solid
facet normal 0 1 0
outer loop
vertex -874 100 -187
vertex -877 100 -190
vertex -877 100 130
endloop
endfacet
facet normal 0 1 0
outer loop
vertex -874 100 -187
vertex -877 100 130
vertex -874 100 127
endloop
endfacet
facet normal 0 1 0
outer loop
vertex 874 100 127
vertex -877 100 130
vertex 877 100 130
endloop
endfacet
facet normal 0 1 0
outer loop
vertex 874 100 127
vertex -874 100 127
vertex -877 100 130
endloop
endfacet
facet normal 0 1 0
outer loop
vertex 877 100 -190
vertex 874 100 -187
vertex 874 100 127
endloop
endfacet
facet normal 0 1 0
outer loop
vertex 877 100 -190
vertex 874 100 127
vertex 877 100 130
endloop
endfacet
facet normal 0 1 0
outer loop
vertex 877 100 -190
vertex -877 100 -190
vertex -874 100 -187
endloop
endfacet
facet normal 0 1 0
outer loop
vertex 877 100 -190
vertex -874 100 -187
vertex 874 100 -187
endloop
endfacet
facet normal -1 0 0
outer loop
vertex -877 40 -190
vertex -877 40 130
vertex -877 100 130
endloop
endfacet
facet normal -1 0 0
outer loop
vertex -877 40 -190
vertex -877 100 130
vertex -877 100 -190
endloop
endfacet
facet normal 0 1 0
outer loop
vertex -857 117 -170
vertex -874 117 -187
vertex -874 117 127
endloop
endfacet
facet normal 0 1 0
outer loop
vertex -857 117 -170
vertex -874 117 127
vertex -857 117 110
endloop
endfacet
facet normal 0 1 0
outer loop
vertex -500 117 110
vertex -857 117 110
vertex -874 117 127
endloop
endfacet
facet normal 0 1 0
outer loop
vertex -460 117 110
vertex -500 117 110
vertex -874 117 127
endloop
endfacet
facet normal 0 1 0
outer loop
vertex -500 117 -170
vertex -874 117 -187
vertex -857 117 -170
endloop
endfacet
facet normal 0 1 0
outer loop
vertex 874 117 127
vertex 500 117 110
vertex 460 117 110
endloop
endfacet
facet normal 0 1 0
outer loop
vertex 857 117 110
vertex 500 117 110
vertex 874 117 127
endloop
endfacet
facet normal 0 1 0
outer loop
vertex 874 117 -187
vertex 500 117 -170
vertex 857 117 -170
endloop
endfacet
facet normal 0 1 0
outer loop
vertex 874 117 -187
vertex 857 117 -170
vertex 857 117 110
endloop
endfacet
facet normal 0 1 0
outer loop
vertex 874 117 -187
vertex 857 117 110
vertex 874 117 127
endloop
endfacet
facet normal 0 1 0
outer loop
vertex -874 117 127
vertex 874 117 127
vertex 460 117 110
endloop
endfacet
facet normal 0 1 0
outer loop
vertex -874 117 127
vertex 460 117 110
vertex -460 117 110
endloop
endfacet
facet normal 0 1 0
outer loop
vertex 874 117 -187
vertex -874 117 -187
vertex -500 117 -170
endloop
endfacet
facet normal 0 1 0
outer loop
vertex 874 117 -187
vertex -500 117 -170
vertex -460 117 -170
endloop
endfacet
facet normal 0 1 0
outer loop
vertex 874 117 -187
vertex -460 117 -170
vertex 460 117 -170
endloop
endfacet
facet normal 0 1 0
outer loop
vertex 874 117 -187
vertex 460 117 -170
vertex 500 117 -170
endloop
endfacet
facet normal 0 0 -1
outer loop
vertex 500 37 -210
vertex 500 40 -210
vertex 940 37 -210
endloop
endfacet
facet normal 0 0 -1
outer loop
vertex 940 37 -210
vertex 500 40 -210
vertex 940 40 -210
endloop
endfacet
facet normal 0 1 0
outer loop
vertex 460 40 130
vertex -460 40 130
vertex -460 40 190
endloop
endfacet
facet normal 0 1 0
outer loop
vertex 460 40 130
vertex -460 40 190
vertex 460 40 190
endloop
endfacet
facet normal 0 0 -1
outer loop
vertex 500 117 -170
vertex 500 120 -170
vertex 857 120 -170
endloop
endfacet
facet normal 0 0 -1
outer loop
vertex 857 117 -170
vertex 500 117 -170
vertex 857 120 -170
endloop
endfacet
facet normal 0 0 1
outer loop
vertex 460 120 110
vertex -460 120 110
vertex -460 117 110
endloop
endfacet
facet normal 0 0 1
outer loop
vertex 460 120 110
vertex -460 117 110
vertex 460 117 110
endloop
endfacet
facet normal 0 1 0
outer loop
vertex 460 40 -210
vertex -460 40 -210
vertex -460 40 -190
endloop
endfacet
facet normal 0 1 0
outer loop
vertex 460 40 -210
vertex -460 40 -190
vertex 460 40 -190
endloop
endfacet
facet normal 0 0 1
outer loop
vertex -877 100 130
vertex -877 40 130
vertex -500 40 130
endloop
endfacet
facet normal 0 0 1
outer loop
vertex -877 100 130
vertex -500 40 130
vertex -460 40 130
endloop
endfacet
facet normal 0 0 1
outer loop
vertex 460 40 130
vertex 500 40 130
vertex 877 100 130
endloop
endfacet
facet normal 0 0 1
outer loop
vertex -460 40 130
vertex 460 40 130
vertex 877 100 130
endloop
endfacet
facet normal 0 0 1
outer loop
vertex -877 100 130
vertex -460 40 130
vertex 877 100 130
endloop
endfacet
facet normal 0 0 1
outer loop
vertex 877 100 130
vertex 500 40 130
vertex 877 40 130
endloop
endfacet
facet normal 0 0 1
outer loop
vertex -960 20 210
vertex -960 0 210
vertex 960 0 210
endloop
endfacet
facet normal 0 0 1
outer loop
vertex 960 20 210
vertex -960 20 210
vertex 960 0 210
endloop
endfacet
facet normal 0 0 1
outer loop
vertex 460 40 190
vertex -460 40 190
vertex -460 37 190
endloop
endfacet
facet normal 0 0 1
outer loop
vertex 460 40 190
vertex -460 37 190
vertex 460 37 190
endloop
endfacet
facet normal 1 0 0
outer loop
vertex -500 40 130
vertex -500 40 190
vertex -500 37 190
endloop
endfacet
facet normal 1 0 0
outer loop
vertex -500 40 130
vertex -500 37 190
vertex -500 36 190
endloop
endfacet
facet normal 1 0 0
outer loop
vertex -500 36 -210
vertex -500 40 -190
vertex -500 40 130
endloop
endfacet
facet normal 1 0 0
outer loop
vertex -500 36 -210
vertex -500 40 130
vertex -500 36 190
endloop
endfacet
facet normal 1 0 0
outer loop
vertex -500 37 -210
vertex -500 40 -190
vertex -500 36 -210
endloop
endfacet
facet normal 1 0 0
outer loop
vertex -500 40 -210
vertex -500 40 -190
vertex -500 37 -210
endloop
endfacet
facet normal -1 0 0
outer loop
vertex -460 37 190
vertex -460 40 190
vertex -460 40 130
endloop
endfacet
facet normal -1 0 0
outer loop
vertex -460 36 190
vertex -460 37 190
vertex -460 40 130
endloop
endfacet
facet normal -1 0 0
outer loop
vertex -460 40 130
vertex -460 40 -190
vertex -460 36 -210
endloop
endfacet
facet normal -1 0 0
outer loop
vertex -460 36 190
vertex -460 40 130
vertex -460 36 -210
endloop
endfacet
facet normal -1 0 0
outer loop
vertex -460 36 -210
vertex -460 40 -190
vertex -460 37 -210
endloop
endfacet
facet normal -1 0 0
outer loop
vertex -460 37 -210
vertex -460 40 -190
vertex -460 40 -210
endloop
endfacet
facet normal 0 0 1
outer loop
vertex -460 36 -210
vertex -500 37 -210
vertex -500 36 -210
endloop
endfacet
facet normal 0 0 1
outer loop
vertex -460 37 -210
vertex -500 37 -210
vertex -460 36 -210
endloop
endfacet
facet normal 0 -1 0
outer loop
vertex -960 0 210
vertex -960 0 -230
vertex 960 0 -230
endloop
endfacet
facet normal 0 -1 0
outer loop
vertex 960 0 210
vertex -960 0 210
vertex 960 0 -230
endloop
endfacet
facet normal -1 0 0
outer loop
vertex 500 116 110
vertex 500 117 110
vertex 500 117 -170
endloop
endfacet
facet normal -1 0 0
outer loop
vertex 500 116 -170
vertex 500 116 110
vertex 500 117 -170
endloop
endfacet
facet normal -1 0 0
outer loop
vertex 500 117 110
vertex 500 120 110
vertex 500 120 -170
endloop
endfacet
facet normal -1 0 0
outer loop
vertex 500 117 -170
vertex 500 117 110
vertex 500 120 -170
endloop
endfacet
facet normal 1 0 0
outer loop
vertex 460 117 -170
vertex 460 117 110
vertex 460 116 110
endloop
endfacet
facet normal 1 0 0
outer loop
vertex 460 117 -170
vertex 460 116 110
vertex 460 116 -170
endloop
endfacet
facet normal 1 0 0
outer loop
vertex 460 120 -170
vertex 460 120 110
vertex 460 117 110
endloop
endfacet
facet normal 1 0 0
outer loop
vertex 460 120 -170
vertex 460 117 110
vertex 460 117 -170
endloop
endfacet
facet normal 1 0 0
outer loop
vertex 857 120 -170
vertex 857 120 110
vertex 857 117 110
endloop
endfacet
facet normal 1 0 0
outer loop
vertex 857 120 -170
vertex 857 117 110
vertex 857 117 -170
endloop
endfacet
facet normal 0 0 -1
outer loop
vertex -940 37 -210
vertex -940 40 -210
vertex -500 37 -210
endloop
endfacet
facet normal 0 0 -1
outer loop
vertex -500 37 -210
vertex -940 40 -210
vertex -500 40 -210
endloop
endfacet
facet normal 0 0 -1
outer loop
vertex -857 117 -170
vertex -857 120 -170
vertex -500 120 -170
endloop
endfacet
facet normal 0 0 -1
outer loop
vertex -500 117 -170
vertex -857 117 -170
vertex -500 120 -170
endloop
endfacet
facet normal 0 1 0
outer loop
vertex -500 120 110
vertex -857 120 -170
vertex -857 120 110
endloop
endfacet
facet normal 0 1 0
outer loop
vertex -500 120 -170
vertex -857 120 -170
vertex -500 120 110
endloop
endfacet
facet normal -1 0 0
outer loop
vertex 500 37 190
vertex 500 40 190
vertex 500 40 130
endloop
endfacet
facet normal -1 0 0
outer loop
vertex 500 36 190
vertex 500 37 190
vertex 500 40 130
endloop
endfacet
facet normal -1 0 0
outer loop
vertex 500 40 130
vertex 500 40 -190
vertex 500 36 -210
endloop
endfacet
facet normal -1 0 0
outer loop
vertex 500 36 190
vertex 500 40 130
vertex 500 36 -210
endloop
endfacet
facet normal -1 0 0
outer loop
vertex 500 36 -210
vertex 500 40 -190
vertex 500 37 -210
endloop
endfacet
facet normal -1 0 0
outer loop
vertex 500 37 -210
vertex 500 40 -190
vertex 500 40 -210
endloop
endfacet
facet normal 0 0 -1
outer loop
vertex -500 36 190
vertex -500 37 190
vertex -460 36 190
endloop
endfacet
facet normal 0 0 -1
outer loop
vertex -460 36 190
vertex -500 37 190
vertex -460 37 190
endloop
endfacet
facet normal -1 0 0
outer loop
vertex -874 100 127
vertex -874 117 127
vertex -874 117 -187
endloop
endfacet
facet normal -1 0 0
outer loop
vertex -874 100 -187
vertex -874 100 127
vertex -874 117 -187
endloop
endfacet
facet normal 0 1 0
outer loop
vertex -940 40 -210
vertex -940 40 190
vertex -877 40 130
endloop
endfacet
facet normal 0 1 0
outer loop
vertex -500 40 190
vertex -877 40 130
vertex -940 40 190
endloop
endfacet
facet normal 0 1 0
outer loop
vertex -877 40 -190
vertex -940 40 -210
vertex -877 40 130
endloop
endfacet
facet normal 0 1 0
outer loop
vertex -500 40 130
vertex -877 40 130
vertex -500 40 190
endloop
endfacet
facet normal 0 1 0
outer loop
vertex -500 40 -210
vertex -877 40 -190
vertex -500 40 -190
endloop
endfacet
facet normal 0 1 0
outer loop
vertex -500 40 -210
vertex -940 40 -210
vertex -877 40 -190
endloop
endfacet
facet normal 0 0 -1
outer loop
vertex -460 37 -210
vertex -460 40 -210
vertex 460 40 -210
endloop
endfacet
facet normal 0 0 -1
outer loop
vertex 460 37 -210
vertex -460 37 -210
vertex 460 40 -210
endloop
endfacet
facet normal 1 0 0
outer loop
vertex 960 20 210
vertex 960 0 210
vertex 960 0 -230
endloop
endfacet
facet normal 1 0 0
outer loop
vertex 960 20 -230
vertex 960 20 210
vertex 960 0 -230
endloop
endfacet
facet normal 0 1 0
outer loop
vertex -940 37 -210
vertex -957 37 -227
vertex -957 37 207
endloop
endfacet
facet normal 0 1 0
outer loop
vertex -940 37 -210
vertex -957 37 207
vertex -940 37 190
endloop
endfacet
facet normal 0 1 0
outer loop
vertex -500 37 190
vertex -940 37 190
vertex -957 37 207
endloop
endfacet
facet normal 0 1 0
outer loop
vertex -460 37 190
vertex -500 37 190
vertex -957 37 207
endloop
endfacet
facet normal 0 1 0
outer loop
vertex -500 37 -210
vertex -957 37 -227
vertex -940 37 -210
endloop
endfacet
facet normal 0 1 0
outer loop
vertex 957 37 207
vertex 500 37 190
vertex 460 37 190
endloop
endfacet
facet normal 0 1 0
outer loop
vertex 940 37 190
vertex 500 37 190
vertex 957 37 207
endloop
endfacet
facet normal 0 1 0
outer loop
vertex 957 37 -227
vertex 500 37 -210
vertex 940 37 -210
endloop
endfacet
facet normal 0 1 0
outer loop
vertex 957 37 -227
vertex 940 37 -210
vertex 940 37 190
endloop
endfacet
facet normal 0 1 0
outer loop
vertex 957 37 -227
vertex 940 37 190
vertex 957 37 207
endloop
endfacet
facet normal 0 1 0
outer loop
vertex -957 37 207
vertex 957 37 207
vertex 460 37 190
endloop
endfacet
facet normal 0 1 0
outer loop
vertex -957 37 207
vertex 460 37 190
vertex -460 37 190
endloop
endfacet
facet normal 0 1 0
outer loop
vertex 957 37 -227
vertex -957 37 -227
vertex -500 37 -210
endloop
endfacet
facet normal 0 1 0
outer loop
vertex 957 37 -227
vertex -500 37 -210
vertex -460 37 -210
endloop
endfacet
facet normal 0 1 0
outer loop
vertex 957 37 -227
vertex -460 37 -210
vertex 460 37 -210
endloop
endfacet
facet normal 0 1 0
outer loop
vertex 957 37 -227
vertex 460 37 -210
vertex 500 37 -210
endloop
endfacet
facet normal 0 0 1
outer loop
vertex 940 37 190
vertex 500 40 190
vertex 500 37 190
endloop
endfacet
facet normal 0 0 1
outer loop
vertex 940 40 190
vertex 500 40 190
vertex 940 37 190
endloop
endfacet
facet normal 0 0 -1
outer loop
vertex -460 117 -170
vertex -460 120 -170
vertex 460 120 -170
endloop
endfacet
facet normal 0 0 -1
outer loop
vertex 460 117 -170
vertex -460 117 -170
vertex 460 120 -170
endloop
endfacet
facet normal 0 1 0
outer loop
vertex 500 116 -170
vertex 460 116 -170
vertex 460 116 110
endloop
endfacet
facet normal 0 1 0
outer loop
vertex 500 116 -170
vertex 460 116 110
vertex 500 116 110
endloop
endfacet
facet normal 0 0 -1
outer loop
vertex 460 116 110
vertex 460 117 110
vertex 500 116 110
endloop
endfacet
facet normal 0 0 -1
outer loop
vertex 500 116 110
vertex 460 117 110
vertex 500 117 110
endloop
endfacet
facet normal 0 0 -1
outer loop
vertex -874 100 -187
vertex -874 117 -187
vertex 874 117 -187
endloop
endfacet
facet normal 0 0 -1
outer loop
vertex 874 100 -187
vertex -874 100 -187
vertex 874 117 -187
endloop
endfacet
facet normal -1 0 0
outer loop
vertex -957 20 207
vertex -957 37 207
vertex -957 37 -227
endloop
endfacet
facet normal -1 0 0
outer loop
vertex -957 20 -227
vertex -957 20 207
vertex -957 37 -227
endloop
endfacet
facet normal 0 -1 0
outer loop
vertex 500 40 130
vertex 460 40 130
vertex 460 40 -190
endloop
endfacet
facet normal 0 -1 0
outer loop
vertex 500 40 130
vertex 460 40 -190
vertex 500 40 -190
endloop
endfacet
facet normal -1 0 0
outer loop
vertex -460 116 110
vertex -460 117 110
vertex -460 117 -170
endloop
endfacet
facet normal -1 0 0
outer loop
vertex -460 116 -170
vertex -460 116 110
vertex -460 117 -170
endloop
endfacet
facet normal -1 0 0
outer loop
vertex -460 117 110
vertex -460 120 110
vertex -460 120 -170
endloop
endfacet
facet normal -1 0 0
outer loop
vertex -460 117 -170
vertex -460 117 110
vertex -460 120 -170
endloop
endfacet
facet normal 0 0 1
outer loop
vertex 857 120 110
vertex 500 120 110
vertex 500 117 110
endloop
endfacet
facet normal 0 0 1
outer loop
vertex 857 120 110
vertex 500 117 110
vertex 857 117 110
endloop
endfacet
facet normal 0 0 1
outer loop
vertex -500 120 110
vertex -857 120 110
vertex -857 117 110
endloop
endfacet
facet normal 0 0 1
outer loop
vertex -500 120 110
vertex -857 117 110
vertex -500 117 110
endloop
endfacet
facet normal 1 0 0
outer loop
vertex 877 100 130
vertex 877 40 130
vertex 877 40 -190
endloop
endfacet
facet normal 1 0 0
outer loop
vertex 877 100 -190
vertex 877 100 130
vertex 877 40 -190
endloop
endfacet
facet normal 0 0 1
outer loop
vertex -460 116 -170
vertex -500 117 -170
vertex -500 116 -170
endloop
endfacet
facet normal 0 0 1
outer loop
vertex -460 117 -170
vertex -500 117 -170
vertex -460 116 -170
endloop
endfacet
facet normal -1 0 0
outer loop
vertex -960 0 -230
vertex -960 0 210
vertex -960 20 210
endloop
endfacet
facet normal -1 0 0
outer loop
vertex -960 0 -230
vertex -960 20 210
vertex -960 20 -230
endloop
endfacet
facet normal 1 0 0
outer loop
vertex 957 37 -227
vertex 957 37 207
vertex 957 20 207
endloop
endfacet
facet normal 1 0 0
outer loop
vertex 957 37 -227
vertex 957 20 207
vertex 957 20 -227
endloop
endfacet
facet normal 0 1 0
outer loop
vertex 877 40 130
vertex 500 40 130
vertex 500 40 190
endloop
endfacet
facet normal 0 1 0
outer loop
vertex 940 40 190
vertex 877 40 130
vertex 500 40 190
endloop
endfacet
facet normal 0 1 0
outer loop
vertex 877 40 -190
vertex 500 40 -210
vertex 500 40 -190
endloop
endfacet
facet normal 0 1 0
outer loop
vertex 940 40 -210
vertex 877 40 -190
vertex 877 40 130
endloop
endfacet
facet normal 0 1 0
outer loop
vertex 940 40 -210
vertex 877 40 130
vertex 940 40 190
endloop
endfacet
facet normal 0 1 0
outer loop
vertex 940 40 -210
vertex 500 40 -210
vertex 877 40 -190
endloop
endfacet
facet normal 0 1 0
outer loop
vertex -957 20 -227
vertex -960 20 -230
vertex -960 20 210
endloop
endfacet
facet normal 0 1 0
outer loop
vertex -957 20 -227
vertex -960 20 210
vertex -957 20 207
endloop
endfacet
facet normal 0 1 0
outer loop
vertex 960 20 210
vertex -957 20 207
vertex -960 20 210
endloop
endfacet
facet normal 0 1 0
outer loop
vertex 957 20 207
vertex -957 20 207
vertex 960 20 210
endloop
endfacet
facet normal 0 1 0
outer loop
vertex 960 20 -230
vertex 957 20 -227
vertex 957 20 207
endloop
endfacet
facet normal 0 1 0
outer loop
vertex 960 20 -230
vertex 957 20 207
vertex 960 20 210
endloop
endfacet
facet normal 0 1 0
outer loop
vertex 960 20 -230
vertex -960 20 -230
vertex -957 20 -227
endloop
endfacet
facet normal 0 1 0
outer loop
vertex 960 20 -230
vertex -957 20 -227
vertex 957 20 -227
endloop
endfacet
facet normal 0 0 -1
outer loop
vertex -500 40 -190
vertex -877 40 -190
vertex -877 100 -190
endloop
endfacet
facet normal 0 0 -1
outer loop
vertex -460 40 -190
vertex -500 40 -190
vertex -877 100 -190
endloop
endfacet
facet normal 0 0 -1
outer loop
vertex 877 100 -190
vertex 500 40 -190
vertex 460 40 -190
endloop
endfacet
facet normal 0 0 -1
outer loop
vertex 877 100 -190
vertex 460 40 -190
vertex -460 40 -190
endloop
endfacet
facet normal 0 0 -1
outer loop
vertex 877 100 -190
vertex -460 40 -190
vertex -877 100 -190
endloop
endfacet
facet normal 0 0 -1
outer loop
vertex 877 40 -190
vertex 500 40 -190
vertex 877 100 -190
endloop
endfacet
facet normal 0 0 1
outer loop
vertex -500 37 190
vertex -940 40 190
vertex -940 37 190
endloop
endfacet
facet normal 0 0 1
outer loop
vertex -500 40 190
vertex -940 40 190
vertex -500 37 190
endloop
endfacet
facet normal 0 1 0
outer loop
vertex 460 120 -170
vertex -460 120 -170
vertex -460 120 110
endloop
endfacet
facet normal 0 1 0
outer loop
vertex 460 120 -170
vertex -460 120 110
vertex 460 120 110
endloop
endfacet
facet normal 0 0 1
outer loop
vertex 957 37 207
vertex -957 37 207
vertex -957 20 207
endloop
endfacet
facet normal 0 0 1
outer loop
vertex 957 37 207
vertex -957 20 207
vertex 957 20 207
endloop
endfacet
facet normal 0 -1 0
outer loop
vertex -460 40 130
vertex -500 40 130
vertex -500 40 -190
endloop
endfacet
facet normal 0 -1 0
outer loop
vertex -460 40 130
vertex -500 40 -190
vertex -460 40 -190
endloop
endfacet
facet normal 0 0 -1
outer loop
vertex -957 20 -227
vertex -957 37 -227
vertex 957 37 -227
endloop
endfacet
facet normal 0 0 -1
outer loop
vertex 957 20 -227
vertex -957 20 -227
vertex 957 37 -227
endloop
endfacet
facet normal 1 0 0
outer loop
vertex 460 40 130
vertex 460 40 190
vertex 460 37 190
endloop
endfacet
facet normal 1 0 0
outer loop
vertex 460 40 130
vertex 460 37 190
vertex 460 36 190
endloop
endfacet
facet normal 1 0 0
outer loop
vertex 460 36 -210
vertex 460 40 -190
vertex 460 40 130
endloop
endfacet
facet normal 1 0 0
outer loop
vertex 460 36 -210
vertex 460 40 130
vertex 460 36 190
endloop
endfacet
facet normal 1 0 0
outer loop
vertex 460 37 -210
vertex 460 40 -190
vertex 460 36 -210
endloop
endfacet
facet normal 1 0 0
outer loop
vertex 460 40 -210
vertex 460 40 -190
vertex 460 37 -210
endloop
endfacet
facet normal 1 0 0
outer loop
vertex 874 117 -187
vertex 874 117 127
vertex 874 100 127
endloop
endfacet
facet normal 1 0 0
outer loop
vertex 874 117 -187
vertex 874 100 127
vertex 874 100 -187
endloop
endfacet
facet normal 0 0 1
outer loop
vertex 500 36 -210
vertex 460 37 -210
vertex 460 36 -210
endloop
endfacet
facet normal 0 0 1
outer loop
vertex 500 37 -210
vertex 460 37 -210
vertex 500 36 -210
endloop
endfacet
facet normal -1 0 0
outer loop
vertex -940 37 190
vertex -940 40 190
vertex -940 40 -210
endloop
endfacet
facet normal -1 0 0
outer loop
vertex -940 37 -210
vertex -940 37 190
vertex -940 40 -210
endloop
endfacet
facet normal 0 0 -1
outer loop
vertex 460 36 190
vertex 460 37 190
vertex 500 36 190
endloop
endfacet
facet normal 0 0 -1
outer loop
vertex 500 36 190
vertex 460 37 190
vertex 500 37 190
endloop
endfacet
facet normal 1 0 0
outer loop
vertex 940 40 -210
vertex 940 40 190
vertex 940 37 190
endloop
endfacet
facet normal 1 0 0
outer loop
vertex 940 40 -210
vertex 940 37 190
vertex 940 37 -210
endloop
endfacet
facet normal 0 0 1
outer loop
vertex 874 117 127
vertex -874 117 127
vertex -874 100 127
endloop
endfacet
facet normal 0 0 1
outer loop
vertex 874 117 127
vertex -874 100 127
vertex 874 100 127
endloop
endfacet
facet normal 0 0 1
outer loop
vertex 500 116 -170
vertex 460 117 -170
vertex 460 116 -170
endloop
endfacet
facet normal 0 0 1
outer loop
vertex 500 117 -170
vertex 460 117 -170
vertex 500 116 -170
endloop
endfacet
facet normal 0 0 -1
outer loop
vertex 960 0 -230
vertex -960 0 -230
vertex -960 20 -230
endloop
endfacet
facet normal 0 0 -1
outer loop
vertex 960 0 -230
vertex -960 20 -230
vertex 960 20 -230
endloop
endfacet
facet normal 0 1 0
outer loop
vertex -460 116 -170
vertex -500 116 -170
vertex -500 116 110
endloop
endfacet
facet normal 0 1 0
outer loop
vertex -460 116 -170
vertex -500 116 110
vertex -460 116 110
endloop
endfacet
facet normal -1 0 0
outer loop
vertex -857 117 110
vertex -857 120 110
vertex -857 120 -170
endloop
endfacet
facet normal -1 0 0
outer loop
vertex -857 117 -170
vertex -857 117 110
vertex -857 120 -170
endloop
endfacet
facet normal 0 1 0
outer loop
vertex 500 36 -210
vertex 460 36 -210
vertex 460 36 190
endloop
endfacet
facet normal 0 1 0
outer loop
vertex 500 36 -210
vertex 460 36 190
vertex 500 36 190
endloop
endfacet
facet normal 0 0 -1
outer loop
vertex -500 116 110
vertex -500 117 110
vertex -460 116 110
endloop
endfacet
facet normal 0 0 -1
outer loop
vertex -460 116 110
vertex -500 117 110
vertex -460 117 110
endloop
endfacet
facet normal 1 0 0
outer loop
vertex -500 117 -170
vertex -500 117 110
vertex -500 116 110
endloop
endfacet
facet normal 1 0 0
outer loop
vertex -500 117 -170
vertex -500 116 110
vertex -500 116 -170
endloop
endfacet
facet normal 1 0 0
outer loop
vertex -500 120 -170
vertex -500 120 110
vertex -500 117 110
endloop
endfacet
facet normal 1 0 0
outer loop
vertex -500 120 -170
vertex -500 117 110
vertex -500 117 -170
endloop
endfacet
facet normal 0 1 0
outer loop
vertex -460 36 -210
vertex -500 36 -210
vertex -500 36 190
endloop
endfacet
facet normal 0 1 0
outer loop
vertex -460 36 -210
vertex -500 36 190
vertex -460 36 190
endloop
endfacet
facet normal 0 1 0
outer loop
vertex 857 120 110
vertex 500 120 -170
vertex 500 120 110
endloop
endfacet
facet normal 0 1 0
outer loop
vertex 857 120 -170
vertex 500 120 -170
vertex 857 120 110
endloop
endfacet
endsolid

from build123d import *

# Parameters (mm, degrees)
SKETCH1_W           = 1920
SKETCH1_H           = 440
BOSS_EXTRUDE1_DEPTH = 40
SKETCH4_W           = 1754
SKETCH4_H           = 320
BOSS_EXTRUDE2_DEPTH = 80
SKETCH5_W           = 1754
SKETCH5_H           = 320
SKETCH5_W_2         = 1714
SKETCH5_H_2         = 280
CUT_EXTRUDE1_DEPTH  = 3
SKETCH6_W           = 1754
SKETCH6_H           = 320
SKETCH6_W_2         = 1748
SKETCH6_H_2         = 314
CUT_EXTRUDE2_DEPTH  = 20
SKETCH7_W           = 40
SKETCH7_H           = 280
CUT_EXTRUDE3_DEPTH  = 4
SKETCH8_W           = 1920
SKETCH8_H           = 440
SKETCH8_W_2         = 1880
SKETCH8_H_2         = 400
CUT_EXTRUDE4_DEPTH  = 3
SKETCH9_W           = 1920
SKETCH9_H           = 440
SKETCH9_W_2         = 1914
SKETCH9_H_2         = 434
CUT_EXTRUDE5_DEPTH  = 20
SKETCH10_W          = 40
SKETCH10_H          = 400
CUT_EXTRUDE9_DEPTH  = 4


with BuildPart() as part:
    # Sketch1 → Boss-Extrude1 (new body)
    with BuildSketch(Plane(origin=(0, 0, 0), x_dir=(1, 0, 0), z_dir=(0, 1, 0))):
        with Locations((0, 10)):
            Rectangle(SKETCH1_W, SKETCH1_H)
    extrude(amount=BOSS_EXTRUDE1_DEPTH)

    # Sketch4 → Boss-Extrude2 (add)
    with BuildSketch(Plane(origin=(0, 40, 0), x_dir=(1, 0, 0), z_dir=(0, 1, 0))):
        with Locations((0, 30)):
            Rectangle(SKETCH4_W, SKETCH4_H)
    extrude(amount=BOSS_EXTRUDE2_DEPTH)

    # Sketch5 → Cut-Extrude1 (cut)
    with BuildSketch(Plane(origin=(0, 120, 0), x_dir=(1, 0, 0), z_dir=(0, 1, 0))):
        with Locations((0, 30)):
            Rectangle(SKETCH5_W, SKETCH5_H)
        with Locations((0, 30)):
            Rectangle(SKETCH5_W_2, SKETCH5_H_2, mode=Mode.SUBTRACT)
    extrude(amount=-CUT_EXTRUDE1_DEPTH, mode=Mode.SUBTRACT)

    # Sketch6 → Cut-Extrude2 (cut)
    with BuildSketch(Plane(origin=(0, 120, 0), x_dir=(1, 0, 0), z_dir=(0, 1, 0))):
        with Locations((0, 30)):
            Rectangle(SKETCH6_W, SKETCH6_H)
        with Locations((0, 30)):
            Rectangle(SKETCH6_W_2, SKETCH6_H_2, mode=Mode.SUBTRACT)
    extrude(amount=-CUT_EXTRUDE2_DEPTH, mode=Mode.SUBTRACT)

    # Sketch7 → Cut-Extrude3 (cut)
    with BuildSketch(Plane(origin=(0, 120, 0), x_dir=(1, 0, 0), z_dir=(0, 1, 0))):
        with Locations((480, 30)):
            Rectangle(SKETCH7_W, SKETCH7_H)
        with Locations((-480, 30)):
            Rectangle(SKETCH7_W, SKETCH7_H)
    extrude(amount=-CUT_EXTRUDE3_DEPTH, mode=Mode.SUBTRACT)

    # Sketch8 → Cut-Extrude4 (cut)
    with BuildSketch(Plane(origin=(0, 40, 0), x_dir=(1, 0, 0), z_dir=(0, 1, 0))):
        with Locations((0, 10)):
            Rectangle(SKETCH8_W, SKETCH8_H)
        with Locations((0, 10)):
            Rectangle(SKETCH8_W_2, SKETCH8_H_2, mode=Mode.SUBTRACT)
    extrude(amount=-CUT_EXTRUDE4_DEPTH, mode=Mode.SUBTRACT)

    # Sketch9 → Cut-Extrude5 (cut)
    with BuildSketch(Plane(origin=(0, 40, 0), x_dir=(1, 0, 0), z_dir=(0, 1, 0))):
        with Locations((0, 10)):
            Rectangle(SKETCH9_W, SKETCH9_H)
        with Locations((0, 10)):
            Rectangle(SKETCH9_W_2, SKETCH9_H_2, mode=Mode.SUBTRACT)
    extrude(amount=-CUT_EXTRUDE5_DEPTH, mode=Mode.SUBTRACT)

    # Sketch10 → Cut-Extrude9 (cut)
    with BuildSketch(Plane(origin=(0, 40, 0), x_dir=(1, 0, 0), z_dir=(0, 1, 0))):
        with Locations((-480, 10)):
            Rectangle(SKETCH10_W, SKETCH10_H)
        with Locations((480, 10)):
            Rectangle(SKETCH10_W, SKETCH10_H)
    extrude(amount=-CUT_EXTRUDE9_DEPTH, mode=Mode.SUBTRACT)


solid = part.part
